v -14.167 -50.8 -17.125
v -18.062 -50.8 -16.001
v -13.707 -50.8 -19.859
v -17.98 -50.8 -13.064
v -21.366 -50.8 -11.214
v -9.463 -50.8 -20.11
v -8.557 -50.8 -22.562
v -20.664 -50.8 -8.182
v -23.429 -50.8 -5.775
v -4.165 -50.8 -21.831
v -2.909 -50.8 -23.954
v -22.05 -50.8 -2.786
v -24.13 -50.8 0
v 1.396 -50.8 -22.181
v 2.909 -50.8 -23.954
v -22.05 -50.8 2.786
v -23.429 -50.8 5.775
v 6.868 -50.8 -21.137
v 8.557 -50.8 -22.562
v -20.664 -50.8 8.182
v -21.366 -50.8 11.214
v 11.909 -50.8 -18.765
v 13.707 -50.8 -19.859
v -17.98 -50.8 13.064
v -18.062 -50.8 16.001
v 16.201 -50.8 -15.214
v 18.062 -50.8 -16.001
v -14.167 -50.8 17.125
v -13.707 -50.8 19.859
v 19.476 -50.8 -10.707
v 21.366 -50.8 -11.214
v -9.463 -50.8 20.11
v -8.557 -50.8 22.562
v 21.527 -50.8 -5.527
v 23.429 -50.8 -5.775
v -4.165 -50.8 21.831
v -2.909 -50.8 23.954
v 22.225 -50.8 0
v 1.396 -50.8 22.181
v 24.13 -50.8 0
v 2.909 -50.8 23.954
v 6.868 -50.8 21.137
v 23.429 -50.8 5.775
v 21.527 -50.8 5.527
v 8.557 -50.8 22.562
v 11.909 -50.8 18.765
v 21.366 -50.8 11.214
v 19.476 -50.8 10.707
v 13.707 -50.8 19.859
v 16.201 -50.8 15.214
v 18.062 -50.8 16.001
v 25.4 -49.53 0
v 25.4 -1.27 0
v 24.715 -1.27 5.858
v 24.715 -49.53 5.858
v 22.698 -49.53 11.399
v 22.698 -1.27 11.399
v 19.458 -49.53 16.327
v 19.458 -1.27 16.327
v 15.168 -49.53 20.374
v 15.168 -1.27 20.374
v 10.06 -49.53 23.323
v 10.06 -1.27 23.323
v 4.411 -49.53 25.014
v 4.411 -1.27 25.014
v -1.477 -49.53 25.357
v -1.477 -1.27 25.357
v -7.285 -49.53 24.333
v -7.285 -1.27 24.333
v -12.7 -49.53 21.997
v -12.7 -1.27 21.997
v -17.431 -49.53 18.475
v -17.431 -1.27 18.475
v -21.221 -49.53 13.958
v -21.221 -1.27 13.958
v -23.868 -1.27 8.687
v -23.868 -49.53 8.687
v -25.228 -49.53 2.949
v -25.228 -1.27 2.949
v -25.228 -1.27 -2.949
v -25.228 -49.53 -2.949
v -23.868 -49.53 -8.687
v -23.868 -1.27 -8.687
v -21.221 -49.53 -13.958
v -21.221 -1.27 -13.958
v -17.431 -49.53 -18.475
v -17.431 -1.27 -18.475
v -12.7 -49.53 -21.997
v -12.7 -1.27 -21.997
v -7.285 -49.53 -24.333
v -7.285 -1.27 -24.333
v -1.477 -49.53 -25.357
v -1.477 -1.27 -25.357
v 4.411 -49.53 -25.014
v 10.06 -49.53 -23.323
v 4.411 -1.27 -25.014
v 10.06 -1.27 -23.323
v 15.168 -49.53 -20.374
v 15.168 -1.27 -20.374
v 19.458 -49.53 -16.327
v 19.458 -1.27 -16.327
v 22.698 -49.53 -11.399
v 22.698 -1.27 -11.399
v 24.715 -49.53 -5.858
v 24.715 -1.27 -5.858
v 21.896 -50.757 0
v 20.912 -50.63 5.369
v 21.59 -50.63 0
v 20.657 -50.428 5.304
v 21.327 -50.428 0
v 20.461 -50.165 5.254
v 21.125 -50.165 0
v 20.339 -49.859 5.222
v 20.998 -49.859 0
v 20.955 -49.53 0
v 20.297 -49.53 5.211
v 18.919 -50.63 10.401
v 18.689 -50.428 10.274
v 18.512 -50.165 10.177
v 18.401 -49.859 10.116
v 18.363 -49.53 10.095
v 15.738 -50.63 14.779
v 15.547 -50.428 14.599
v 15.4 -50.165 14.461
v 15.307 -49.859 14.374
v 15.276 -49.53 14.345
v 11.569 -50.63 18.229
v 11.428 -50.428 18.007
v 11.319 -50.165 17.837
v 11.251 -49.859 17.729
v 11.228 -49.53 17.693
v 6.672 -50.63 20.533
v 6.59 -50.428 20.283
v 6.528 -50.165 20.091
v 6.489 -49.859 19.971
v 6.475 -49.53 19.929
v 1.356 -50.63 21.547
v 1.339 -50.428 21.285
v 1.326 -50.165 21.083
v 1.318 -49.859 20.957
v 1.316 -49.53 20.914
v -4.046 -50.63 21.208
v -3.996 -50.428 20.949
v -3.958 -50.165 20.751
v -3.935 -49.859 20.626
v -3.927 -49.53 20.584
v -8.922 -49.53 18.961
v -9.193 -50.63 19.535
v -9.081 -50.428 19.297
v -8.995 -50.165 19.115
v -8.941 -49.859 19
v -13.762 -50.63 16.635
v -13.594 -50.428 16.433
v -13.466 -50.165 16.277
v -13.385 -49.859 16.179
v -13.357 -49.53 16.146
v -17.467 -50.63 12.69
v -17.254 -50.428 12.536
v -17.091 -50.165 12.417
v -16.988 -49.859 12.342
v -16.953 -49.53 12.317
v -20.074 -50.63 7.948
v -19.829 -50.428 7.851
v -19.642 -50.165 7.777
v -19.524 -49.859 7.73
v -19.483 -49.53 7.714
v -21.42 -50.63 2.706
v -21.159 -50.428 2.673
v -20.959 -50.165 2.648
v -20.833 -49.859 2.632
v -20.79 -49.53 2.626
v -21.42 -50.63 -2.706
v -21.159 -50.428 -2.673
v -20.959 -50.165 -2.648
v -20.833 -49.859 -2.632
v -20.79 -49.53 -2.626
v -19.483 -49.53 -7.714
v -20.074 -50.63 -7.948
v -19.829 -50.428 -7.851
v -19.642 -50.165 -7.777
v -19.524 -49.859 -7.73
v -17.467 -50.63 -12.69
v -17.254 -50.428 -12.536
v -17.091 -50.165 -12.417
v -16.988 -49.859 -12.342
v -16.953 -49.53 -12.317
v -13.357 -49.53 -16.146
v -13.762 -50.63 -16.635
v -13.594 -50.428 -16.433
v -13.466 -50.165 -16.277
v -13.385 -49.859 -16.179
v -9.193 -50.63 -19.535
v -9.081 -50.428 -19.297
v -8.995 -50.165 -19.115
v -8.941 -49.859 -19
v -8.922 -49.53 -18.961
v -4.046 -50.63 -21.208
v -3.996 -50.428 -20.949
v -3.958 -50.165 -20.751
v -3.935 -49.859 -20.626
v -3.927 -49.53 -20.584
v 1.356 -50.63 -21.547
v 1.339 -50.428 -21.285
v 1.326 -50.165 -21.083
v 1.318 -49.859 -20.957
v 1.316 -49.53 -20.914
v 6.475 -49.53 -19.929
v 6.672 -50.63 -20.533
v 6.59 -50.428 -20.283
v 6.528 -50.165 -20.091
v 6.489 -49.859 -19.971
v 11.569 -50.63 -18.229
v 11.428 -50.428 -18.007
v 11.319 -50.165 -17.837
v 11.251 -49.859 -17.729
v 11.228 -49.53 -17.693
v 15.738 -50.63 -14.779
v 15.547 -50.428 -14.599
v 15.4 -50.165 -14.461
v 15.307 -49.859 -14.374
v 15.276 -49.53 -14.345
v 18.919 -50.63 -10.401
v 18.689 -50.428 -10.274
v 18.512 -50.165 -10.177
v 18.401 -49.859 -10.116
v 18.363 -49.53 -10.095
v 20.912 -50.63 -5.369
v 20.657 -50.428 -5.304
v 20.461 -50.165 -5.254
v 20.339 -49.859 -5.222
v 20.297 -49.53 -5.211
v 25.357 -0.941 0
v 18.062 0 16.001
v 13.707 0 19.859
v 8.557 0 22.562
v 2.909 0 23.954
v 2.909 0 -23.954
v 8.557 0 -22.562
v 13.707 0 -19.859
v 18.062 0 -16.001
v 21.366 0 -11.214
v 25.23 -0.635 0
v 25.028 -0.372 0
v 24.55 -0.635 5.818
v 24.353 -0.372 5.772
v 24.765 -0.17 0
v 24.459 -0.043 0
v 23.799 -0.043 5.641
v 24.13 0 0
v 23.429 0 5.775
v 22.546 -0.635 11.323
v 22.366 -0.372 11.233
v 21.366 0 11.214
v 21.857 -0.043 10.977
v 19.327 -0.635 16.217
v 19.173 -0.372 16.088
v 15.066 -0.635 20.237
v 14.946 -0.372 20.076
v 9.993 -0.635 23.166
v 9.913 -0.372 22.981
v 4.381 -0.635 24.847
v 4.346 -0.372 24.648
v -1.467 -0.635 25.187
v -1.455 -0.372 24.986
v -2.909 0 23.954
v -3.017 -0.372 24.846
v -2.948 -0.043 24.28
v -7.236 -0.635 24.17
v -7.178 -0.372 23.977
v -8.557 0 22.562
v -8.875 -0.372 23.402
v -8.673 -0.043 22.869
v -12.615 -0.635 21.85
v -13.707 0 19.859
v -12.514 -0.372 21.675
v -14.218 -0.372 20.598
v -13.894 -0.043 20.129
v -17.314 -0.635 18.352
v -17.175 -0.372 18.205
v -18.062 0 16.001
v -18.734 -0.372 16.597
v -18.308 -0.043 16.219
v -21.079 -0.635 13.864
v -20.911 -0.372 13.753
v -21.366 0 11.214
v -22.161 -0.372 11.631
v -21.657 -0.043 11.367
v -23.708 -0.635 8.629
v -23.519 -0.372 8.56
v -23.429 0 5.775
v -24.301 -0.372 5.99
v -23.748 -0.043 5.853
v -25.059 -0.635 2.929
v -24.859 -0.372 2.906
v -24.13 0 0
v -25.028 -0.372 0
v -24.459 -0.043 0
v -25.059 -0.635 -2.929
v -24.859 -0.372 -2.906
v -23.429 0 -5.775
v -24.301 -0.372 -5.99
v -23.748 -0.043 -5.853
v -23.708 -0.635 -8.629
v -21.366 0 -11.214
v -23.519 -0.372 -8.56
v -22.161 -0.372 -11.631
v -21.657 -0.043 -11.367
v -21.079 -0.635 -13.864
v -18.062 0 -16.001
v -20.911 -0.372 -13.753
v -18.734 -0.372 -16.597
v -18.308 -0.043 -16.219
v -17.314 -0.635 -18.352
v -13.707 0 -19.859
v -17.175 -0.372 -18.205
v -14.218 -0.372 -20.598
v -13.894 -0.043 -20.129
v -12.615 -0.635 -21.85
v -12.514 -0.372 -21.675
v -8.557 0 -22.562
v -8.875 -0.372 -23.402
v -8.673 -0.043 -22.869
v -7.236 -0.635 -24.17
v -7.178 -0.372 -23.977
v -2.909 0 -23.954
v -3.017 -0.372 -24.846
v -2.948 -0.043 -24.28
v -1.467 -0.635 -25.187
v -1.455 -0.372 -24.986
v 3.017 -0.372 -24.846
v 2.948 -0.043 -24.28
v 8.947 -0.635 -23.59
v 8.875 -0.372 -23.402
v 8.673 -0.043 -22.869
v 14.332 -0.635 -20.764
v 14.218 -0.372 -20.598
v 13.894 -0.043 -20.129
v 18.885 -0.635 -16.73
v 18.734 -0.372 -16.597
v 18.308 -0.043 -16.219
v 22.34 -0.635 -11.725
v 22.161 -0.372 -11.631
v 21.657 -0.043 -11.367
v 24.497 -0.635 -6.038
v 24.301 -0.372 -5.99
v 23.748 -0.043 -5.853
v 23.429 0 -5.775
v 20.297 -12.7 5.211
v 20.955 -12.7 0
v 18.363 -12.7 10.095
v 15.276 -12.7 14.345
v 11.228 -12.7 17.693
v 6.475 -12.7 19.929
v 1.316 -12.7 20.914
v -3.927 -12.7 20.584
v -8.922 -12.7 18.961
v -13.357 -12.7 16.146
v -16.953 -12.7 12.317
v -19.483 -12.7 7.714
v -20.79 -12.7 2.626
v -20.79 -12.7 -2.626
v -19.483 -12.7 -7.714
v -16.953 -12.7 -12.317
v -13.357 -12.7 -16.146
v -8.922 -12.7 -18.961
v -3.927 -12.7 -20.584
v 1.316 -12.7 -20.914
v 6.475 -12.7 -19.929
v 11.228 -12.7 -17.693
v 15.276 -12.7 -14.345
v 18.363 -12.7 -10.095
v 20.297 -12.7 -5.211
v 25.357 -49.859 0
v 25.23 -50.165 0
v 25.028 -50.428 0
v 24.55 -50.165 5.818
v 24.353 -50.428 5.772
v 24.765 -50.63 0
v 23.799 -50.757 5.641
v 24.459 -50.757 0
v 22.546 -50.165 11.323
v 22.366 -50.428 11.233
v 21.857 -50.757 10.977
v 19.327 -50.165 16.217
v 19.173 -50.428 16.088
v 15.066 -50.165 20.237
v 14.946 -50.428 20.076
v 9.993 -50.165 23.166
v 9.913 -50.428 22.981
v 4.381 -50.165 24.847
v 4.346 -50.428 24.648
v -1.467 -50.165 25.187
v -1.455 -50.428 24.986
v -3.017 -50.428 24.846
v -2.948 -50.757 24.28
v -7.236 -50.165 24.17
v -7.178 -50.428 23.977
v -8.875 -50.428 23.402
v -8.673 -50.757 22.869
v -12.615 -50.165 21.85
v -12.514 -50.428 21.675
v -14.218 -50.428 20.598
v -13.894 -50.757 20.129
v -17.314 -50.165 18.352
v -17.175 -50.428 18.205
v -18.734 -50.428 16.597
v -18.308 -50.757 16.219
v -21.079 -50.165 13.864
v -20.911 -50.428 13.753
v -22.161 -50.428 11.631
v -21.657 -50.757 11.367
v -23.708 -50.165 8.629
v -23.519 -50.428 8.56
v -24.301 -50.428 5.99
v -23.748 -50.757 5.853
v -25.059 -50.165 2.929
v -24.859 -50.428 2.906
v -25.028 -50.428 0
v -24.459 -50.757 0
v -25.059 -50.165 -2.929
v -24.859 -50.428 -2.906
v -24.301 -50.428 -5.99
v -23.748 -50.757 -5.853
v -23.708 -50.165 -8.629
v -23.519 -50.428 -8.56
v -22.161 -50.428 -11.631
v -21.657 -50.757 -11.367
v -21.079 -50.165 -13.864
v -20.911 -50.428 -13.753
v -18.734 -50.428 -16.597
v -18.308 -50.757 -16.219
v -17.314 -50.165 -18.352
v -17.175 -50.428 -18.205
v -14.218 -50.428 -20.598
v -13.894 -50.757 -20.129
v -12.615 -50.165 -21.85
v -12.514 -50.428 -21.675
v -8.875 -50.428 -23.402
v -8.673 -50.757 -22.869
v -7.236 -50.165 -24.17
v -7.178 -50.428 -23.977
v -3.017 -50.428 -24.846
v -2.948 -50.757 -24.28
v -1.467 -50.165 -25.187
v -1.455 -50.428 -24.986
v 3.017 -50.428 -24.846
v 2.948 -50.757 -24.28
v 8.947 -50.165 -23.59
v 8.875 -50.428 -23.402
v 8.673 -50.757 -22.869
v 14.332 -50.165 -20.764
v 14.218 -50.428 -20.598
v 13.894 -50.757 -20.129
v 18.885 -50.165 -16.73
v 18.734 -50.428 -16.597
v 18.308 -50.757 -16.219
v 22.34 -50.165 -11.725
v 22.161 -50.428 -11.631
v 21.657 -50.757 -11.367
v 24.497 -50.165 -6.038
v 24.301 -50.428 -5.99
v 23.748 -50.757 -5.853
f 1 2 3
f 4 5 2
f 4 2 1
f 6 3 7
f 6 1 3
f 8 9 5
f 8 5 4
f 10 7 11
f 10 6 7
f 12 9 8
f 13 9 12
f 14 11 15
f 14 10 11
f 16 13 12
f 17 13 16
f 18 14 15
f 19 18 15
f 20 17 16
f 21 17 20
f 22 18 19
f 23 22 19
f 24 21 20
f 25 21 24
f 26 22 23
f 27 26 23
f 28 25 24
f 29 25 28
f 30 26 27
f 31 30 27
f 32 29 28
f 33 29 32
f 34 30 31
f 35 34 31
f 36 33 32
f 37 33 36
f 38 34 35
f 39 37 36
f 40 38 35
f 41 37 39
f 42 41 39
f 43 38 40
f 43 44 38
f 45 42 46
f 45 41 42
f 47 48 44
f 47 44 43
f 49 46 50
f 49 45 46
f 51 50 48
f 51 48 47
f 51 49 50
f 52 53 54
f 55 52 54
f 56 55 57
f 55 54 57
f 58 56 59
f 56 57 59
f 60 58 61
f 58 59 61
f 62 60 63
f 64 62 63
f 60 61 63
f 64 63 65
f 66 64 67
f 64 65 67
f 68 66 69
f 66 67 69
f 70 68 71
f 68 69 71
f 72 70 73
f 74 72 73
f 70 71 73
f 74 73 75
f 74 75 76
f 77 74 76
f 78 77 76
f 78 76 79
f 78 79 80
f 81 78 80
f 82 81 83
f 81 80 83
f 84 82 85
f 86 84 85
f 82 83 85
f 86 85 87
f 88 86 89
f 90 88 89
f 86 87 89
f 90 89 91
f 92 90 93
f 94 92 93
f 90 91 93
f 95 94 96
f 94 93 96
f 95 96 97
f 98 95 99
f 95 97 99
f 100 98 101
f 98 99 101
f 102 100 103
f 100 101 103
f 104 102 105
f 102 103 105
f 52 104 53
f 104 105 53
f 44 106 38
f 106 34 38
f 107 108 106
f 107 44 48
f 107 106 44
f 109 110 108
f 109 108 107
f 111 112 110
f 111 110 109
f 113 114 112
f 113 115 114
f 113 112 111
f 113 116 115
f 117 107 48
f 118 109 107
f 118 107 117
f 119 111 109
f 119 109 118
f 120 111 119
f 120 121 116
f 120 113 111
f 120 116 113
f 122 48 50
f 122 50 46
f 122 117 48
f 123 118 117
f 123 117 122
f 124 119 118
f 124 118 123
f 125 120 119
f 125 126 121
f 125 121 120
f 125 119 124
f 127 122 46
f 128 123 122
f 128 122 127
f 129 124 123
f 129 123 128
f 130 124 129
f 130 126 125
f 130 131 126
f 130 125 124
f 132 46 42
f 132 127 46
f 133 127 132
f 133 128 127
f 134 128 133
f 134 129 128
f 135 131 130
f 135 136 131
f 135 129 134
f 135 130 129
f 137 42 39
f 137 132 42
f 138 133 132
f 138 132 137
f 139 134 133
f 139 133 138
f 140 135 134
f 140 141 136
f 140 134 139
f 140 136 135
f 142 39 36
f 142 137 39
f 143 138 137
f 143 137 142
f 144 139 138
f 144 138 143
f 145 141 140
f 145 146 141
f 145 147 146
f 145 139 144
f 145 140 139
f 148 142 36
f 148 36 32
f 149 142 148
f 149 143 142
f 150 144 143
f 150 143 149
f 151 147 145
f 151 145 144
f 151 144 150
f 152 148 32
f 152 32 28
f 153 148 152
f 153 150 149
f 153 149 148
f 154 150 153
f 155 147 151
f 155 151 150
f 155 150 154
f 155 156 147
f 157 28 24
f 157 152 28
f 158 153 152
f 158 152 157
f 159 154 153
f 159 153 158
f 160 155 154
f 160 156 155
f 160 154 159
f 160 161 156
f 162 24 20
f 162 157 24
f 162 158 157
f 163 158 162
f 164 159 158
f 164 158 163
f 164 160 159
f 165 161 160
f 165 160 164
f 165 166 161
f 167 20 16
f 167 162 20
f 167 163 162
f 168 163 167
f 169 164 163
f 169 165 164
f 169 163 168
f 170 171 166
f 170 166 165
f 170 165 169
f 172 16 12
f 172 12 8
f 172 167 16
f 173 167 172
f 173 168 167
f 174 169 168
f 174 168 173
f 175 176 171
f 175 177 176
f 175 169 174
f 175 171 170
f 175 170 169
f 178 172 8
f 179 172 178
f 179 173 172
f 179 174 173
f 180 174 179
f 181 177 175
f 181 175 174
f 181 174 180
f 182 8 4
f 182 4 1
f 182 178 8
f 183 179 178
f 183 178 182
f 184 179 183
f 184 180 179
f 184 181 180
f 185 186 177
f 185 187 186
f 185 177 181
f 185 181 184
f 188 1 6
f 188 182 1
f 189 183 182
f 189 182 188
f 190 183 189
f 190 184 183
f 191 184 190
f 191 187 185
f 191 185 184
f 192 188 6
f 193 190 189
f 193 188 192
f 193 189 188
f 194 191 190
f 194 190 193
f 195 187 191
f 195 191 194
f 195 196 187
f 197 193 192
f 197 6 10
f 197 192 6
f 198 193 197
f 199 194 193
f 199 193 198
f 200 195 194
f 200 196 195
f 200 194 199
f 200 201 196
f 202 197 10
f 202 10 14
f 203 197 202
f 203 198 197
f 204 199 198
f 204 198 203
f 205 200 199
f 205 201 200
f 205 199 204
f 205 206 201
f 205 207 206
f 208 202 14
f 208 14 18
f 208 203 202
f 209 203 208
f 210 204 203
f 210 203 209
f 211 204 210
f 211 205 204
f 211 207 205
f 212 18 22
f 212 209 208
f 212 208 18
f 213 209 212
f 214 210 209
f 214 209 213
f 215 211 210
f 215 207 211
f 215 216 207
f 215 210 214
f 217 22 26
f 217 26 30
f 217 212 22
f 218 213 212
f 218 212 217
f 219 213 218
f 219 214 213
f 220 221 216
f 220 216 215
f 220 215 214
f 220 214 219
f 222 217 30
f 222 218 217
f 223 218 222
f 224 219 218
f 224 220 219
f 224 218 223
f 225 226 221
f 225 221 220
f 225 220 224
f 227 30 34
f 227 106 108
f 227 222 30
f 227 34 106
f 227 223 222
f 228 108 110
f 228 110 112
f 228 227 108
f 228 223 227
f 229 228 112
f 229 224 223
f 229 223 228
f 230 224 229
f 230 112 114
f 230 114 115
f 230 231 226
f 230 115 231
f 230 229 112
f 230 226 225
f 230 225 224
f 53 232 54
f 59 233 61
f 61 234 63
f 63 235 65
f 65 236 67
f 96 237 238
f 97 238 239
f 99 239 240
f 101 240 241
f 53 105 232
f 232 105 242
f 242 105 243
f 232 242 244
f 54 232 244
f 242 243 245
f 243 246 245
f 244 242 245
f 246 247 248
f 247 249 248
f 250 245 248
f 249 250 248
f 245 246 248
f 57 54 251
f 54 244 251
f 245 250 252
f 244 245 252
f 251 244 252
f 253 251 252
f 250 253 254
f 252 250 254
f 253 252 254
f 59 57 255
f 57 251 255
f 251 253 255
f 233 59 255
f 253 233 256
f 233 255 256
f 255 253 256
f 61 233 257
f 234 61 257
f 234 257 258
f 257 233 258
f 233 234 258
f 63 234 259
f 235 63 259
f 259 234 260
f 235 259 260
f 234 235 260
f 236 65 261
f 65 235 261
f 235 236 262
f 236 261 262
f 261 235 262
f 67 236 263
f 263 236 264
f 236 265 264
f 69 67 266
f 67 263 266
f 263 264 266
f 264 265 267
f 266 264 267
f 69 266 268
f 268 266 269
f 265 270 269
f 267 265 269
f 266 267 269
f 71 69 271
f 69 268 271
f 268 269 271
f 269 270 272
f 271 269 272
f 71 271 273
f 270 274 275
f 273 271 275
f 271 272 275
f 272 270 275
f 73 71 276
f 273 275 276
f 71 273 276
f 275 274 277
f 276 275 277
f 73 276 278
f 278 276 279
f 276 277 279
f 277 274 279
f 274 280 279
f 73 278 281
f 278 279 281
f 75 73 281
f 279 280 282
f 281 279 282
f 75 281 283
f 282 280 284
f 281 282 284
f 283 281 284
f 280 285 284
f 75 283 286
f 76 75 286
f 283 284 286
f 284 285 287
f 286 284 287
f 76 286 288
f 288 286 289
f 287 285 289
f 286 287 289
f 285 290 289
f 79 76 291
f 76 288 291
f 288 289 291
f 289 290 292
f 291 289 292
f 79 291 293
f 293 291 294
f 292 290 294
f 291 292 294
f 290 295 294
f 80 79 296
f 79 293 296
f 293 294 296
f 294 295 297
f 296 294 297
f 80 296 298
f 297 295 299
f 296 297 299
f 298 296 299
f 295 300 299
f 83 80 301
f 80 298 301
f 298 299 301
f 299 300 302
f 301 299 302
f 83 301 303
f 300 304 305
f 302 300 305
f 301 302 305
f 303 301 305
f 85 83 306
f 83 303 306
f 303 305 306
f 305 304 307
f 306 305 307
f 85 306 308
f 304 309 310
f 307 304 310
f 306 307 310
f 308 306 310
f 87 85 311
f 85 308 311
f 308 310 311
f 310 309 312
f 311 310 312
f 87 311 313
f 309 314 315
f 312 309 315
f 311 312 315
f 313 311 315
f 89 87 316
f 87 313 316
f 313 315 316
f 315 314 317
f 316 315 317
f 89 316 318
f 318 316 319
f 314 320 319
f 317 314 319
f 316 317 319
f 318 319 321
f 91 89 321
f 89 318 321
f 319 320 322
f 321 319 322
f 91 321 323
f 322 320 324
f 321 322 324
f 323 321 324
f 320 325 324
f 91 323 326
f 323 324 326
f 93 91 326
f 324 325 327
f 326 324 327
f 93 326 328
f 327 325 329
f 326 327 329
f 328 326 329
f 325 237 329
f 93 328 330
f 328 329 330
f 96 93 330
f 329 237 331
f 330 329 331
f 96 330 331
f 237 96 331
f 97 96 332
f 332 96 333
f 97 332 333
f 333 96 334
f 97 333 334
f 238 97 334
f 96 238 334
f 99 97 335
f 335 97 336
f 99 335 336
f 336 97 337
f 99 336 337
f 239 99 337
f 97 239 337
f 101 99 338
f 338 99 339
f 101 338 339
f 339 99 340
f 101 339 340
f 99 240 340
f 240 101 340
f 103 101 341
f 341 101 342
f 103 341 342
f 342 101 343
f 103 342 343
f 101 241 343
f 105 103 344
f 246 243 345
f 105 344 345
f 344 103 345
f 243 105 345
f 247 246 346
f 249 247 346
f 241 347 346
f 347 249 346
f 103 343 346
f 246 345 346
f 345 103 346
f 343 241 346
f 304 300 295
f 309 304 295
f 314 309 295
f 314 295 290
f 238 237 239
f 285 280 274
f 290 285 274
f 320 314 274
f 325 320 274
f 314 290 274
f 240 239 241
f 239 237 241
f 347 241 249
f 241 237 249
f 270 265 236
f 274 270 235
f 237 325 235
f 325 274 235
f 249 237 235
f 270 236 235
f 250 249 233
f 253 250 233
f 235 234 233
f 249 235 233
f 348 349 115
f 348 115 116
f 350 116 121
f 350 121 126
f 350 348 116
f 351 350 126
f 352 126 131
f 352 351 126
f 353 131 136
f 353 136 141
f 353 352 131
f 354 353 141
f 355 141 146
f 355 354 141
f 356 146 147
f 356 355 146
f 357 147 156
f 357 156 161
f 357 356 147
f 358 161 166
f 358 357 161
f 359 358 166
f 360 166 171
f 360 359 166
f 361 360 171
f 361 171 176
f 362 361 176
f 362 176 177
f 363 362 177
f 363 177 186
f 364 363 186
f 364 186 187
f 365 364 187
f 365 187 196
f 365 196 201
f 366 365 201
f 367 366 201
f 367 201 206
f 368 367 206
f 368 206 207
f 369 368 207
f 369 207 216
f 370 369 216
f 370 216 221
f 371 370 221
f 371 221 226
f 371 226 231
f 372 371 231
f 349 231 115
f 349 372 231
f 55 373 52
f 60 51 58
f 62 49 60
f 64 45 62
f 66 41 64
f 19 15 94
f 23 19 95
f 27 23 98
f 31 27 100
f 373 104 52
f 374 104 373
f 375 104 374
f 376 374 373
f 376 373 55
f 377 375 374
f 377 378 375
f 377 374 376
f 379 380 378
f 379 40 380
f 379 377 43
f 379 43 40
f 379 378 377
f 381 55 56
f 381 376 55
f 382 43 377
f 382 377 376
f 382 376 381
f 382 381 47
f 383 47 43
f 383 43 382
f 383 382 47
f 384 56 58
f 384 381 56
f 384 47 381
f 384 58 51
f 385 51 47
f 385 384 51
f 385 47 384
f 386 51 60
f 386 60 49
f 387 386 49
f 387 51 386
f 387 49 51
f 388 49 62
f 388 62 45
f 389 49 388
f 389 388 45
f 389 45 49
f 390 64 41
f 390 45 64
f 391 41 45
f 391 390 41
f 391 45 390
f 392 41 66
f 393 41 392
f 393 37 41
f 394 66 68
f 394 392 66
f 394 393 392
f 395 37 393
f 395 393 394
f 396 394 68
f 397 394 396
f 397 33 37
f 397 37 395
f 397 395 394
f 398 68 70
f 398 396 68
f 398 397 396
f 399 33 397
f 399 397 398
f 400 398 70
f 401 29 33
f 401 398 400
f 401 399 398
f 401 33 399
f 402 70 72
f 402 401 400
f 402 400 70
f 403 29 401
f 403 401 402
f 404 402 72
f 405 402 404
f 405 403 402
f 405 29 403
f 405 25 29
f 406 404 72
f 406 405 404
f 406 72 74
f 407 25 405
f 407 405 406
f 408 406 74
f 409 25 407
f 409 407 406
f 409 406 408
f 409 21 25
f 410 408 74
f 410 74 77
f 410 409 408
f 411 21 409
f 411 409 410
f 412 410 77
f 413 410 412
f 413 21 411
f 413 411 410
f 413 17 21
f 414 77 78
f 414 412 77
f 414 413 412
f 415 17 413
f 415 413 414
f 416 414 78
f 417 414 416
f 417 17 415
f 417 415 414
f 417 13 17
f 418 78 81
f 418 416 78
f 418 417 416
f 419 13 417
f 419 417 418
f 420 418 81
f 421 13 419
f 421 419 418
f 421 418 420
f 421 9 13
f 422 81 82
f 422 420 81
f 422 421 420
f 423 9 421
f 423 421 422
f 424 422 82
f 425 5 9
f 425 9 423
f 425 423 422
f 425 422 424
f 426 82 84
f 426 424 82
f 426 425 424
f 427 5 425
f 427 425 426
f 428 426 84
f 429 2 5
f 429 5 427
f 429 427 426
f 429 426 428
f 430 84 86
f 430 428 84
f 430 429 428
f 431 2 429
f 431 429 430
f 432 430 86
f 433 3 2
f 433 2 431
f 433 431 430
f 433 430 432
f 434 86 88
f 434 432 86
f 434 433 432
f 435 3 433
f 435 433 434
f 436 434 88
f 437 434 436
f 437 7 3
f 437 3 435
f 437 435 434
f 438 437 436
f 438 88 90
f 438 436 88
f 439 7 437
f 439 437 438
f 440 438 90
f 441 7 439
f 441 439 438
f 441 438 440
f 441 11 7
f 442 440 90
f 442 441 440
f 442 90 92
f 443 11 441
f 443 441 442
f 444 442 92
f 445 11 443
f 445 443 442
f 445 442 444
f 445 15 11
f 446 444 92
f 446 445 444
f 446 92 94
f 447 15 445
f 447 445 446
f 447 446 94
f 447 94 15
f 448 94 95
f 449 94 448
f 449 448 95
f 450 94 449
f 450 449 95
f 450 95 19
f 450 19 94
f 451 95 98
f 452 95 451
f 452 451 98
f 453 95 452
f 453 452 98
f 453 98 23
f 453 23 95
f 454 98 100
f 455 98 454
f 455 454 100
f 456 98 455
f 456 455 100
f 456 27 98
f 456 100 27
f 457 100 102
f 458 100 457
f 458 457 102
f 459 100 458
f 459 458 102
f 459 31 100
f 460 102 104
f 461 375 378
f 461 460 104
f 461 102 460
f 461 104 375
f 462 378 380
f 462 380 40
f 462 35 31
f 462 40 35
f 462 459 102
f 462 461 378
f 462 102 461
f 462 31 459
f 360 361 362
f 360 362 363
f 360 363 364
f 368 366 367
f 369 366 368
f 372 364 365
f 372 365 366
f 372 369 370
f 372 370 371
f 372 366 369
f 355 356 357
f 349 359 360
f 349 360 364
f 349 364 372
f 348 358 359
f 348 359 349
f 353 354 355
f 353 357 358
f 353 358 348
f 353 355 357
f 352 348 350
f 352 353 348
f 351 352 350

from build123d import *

# Parameters (mm, degrees)
F0_R     = 25.4
F0_R_2   = 20.955
F2_DEPTH = 50.8
F1_R     = 20.955
F3_DEPTH = 12.7
F4_R     = 1.27
F5_R     = 1.27
F6_R     = 1.27


with BuildPart() as f2:
    # F0 (on Front) → F2 (new body)
    with BuildSketch(Plane.XZ):
        Circle(F0_R)
        Circle(F0_R_2, mode=Mode.SUBTRACT)
    extrude(amount=F2_DEPTH)

    # F1 (on face) → F3 (join)
    with BuildSketch(Plane.XZ):
        Circle(F1_R)
    extrude(amount=F3_DEPTH)

    # F4
    f4_edges = [f2.edges().sort_by_distance(p)[0] for p in [
        (-25.4, -50.8, 0),
    ]]
    fillet(f4_edges, radius=F4_R)

    # F5
    f5_edges = [f2.edges().sort_by_distance(p)[0] for p in [
        (-20.955, -50.8, 0),
    ]]
    fillet(f5_edges, radius=F5_R)

    # F6
    f6_edges = [f2.edges().sort_by_distance(p)[0] for p in [
        (-25.4, 0, 0),
    ]]
    fillet(f6_edges, radius=F6_R)


solid = f2.part
